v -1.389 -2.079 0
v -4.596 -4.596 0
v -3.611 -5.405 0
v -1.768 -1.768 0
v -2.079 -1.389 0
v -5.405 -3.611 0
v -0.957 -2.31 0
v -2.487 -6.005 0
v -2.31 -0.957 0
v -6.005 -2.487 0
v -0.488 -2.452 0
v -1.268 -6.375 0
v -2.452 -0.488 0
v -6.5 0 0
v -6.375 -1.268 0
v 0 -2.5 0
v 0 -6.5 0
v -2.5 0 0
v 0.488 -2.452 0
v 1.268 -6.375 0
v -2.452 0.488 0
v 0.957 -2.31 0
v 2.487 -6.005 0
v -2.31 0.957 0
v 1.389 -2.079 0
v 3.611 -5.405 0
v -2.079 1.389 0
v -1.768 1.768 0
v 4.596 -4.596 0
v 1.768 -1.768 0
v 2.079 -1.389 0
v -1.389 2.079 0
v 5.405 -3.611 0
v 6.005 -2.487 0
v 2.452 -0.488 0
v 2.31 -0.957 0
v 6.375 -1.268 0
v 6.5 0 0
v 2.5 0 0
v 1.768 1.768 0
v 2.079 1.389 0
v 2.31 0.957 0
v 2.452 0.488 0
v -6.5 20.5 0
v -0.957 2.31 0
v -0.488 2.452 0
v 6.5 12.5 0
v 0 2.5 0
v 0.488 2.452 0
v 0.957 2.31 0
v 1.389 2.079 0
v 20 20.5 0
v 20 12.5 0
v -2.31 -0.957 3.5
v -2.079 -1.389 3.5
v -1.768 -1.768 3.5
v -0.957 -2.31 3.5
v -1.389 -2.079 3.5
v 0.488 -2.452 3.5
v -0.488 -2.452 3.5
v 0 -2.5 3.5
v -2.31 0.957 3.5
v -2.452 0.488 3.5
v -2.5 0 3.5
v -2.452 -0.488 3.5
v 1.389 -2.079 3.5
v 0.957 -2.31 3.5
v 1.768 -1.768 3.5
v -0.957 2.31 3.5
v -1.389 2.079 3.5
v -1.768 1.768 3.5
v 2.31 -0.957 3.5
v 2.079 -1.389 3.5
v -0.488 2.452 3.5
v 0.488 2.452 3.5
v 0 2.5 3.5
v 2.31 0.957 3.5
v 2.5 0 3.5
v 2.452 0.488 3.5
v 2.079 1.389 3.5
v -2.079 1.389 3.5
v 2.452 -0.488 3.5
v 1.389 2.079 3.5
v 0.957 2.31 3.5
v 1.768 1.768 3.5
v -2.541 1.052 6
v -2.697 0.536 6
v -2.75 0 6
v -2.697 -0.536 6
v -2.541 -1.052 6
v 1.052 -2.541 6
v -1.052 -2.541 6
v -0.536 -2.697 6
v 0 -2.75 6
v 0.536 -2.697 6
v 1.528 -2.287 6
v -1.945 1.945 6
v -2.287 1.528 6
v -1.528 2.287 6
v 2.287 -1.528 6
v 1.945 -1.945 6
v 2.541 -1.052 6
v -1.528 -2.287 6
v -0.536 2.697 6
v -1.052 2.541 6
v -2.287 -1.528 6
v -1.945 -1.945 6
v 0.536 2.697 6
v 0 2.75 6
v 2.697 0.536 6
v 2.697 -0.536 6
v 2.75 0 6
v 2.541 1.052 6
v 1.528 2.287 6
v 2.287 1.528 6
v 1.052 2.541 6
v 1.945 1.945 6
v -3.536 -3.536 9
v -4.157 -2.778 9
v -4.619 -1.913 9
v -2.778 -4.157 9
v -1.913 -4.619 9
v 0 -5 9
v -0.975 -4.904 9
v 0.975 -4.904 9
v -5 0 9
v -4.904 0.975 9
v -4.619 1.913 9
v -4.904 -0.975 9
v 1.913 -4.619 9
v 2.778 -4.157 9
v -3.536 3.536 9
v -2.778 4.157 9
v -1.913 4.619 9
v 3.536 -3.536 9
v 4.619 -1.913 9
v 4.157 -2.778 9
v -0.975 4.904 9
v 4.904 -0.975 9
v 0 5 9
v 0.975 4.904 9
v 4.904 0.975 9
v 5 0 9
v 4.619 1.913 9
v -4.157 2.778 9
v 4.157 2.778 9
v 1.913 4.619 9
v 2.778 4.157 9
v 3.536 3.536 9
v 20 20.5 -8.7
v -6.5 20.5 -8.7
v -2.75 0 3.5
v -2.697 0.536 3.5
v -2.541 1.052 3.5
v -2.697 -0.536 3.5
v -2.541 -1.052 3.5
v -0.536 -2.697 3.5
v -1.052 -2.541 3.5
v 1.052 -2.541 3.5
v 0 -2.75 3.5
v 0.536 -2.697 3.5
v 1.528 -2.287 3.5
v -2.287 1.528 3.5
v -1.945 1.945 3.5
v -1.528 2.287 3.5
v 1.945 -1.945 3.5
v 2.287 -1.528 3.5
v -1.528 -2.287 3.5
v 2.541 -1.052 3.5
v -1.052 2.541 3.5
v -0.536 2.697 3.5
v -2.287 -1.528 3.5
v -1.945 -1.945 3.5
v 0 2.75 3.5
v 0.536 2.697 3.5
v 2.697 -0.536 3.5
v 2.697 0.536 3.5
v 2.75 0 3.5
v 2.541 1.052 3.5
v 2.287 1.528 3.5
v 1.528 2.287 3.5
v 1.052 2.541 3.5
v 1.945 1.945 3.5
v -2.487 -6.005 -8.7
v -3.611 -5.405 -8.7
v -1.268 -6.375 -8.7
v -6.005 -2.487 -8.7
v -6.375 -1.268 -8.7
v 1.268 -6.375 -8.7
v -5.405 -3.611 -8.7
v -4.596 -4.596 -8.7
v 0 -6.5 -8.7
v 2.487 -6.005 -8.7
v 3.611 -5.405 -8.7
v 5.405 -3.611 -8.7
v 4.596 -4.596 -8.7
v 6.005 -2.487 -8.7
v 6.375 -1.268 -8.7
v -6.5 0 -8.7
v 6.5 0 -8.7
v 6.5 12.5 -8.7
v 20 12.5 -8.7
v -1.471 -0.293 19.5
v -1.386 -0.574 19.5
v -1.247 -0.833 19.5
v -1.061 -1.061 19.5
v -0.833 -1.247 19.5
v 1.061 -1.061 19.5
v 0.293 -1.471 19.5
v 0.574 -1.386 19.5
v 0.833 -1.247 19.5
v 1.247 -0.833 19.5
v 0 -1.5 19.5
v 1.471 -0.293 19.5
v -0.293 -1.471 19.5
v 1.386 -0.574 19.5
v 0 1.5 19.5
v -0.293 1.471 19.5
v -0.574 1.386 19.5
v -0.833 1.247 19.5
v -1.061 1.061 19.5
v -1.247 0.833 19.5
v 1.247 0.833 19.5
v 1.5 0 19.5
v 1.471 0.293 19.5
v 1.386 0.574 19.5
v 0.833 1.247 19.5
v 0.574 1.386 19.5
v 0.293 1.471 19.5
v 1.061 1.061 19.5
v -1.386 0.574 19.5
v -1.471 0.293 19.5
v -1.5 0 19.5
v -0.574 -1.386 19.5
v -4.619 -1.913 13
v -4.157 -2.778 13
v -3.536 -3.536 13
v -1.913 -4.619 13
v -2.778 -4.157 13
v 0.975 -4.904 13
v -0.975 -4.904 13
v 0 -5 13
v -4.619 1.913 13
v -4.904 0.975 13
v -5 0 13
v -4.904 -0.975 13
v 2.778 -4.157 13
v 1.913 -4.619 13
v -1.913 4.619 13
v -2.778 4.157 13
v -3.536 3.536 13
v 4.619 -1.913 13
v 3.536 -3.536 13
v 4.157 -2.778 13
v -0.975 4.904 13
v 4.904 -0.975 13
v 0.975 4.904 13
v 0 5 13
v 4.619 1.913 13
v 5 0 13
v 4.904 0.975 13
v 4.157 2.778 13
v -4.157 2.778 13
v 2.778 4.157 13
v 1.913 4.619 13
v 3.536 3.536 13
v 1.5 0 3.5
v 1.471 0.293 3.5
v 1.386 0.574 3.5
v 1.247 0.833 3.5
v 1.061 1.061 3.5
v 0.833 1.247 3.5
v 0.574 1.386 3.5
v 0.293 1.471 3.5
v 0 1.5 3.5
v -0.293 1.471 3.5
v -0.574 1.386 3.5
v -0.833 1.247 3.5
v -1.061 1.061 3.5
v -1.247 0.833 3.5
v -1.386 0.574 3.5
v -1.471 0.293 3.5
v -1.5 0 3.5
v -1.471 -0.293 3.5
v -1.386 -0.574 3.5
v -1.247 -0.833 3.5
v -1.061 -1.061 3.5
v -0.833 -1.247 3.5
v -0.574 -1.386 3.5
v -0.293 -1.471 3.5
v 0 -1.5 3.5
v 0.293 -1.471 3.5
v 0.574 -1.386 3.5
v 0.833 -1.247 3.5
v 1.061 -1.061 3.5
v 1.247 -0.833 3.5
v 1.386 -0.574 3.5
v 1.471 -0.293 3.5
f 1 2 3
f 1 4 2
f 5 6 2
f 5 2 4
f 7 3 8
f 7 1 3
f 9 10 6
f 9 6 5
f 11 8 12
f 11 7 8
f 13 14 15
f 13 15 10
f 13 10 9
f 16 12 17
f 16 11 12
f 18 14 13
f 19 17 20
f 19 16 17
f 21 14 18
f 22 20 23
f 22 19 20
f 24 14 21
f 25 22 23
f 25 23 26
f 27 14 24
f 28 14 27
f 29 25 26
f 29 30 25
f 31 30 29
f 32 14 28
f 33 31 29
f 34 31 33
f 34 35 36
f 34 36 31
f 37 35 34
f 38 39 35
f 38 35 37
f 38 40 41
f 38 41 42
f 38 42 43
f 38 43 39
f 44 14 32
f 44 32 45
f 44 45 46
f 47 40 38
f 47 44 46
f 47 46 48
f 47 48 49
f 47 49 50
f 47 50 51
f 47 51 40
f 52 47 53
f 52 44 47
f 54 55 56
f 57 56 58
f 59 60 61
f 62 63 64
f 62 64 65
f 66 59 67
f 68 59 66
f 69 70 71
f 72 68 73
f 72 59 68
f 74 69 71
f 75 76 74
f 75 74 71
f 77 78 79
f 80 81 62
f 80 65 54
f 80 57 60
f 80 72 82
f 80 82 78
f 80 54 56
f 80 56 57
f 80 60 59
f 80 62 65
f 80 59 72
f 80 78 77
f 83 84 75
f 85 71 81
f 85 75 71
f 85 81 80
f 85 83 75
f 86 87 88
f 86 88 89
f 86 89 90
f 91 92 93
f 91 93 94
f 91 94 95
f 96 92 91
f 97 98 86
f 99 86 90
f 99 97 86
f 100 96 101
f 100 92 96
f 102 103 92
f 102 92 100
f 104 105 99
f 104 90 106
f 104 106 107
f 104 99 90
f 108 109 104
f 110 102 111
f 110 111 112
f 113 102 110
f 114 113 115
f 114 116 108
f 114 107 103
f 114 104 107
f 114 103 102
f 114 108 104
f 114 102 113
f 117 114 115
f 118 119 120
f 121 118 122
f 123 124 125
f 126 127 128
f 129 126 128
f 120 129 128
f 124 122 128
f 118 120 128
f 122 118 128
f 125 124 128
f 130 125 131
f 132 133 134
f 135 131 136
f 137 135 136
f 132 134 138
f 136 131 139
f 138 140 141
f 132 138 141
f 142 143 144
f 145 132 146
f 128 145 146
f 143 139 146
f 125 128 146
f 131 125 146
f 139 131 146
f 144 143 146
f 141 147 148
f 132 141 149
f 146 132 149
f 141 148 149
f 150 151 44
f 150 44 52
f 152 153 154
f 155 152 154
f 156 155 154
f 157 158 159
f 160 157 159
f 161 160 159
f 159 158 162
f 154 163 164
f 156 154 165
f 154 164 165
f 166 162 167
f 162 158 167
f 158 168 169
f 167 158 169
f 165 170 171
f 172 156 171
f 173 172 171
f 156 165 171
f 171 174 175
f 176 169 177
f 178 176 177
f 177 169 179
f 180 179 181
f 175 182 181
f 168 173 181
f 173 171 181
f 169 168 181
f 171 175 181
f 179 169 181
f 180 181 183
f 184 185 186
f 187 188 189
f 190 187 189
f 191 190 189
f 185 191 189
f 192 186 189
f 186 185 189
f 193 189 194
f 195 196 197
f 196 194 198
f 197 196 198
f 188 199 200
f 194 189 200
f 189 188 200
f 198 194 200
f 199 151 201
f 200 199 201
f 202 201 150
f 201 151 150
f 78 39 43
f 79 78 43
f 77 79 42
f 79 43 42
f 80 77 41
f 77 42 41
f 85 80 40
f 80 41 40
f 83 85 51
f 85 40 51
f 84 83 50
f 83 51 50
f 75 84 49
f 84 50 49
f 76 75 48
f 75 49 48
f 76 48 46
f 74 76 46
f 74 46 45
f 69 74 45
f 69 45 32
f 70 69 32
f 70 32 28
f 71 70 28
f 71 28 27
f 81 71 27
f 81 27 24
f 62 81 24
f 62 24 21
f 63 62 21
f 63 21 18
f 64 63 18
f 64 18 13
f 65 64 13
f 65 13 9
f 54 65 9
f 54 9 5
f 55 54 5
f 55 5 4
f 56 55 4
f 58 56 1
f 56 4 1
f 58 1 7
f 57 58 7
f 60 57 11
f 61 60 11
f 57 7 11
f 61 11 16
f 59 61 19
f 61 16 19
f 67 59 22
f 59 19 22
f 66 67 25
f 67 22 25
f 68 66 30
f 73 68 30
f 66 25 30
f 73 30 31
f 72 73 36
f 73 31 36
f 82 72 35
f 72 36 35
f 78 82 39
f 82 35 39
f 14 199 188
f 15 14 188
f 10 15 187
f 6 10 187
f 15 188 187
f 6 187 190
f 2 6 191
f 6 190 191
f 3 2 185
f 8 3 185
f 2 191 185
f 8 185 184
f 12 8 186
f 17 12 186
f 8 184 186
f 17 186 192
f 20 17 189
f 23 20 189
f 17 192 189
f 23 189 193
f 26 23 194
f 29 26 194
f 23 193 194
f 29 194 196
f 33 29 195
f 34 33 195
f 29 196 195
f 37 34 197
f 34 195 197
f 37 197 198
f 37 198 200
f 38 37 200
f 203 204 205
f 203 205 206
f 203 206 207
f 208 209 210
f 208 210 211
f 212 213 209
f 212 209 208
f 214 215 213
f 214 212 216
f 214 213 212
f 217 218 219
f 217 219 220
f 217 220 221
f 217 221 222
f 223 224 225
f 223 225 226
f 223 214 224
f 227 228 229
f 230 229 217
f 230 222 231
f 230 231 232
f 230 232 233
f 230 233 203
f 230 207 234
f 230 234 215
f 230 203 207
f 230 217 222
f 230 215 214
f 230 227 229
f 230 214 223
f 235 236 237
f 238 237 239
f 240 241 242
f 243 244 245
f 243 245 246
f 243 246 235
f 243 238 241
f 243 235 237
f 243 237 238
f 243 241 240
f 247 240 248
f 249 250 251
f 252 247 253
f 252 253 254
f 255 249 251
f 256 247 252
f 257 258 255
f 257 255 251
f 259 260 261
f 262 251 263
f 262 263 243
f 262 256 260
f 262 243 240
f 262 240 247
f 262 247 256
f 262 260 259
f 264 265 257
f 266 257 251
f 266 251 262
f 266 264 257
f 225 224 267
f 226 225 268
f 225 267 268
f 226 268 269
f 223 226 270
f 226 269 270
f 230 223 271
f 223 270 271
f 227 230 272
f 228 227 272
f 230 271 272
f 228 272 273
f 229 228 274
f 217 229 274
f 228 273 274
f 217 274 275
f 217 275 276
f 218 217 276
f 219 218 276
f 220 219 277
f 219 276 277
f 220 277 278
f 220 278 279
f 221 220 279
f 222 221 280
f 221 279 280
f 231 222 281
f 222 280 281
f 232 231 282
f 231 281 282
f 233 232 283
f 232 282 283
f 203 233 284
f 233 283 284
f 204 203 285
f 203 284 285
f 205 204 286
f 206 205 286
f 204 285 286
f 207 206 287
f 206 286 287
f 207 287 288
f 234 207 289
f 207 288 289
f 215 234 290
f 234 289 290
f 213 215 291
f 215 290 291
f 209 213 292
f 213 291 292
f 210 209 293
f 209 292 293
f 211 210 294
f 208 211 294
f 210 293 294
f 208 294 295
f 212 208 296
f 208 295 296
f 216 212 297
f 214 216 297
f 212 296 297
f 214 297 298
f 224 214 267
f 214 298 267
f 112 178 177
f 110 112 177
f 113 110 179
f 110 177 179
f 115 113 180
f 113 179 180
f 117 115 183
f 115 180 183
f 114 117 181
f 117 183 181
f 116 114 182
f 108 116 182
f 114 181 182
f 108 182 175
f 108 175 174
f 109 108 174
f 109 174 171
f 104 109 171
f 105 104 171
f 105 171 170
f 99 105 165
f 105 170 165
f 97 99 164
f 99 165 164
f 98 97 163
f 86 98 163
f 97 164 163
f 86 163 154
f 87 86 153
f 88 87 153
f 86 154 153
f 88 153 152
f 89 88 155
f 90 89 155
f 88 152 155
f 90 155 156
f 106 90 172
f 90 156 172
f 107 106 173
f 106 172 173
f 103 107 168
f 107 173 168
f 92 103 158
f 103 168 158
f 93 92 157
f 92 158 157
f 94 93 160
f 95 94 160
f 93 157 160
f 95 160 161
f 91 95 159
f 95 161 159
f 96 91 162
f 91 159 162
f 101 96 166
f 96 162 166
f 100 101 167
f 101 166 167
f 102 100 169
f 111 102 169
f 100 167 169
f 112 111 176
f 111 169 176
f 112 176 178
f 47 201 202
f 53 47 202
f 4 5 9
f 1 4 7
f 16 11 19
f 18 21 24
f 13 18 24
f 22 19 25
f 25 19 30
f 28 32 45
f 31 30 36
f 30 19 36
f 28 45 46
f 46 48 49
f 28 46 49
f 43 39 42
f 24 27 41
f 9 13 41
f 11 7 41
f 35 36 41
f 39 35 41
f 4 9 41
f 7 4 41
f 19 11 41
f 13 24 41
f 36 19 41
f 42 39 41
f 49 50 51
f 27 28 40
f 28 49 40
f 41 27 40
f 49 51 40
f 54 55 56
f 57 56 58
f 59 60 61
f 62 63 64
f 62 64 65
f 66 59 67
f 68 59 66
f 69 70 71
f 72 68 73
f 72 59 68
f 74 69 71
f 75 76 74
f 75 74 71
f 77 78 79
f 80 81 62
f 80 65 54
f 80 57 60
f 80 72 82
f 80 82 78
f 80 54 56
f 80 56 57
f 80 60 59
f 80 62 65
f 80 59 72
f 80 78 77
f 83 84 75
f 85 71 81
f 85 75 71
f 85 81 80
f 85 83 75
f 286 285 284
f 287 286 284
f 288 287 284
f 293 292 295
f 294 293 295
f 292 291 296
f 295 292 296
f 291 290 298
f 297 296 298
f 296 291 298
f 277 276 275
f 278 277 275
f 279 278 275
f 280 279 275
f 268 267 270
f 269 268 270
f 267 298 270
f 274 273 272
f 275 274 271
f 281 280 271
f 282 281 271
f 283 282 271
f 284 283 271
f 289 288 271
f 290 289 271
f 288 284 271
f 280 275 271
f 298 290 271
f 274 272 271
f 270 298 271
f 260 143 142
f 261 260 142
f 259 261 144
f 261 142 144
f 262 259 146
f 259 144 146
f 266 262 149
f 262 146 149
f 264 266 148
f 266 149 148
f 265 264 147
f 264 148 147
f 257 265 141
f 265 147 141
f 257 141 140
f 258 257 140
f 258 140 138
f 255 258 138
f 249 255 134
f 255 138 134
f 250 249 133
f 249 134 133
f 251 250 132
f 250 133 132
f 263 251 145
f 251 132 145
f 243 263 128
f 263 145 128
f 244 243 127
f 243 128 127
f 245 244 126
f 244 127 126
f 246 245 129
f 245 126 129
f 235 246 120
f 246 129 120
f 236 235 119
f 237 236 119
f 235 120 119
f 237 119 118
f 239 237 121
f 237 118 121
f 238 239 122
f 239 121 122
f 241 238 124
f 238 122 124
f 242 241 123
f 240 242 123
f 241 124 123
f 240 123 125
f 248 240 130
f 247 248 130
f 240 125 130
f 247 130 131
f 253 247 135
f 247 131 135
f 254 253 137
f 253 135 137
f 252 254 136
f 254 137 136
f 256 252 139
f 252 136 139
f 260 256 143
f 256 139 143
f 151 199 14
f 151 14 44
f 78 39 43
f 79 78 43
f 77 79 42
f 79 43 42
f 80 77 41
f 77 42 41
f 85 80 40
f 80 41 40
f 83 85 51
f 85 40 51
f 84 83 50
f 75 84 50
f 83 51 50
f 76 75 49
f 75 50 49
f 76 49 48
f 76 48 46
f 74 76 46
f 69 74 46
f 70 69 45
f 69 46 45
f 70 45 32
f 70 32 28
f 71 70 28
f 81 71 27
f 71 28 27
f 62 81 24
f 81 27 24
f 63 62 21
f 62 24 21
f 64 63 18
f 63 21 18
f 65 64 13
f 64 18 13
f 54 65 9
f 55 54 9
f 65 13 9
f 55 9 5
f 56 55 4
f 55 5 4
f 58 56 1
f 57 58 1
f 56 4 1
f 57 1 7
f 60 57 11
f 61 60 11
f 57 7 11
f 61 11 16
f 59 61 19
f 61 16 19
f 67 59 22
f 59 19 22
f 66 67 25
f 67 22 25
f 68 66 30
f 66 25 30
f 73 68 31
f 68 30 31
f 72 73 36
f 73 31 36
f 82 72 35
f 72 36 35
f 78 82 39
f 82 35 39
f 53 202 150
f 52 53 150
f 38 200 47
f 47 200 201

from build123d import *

# Parameters (mm, degrees)
CYLINDER_R        = 1.5
CYLINDER_DEPTH    = 16
CYLINDER001_R     = 2.75
CYLINDER001_DEPTH = 2.5
CYLINDER003_R     = 6.5
CYLINDER003_DEPTH = 8.7
BOX001_W          = 25
BOX001_H          = 8
BOX001_DEPTH      = 8.7
BOX_W             = 13
BOX_H             = 20.5
BOX_DEPTH         = 8.7
CYLINDER002_R     = 2.5
CYLINDER002_DEPTH = 3.5
CYLINDER004_R     = 2.5
CYLINDER004_DEPTH = 3.5
CYLINDER005_R     = 5
CYLINDER005_DEPTH = 4


with BuildPart() as cylinder:
    # Cylinder → Cylinder (new body)
    with BuildSketch(Plane.XY.offset(3.5)):
        Circle(CYLINDER_R)
    extrude(amount=CYLINDER_DEPTH)


with BuildPart() as cylinder001:
    # Cylinder001 → Cylinder001 (new body)
    with BuildSketch(Plane.XY.offset(3.5)):
        Circle(CYLINDER001_R)
    extrude(amount=CYLINDER001_DEPTH)


with BuildPart() as cylinder003:
    # Cylinder003 → Cylinder003 (new body)
    with BuildSketch(Plane.XY.offset(-8.7)):
        Circle(CYLINDER003_R)
    extrude(amount=CYLINDER003_DEPTH)


with BuildPart() as cube001:
    # Box001 → Box001 (new body)
    with BuildSketch(Plane(origin=(-5, 12.5, -8.7), x_dir=(1, 0, 0), z_dir=(0, 0, 1))):
        with Locations((12.5, 4)):
            Rectangle(BOX001_W, BOX001_H)
    extrude(amount=BOX001_DEPTH)


with BuildPart() as cube:
    # Box → Box (new body)
    with BuildSketch(Plane(origin=(-6.5, 0, -8.7), x_dir=(1, 0, 0), z_dir=(0, 0, 1))):
        with Locations((6.5, 10.25)):
            Rectangle(BOX_W, BOX_H)
    extrude(amount=BOX_DEPTH)


with BuildPart() as motor:
    # Cylinder002 → Cylinder002 (new body)
    with BuildSketch(Plane.XY):
        Circle(CYLINDER002_R)
    extrude(amount=CYLINDER002_DEPTH)

    # Fusion: union Cylinder003, Cube001, Cube
    add(cylinder003.part)
    add(cube001.part)
    add(cube.part)


with BuildPart() as cylinder004:
    # Cylinder004 → Cylinder004 (new body)
    with BuildSketch(Plane.XY):
        Circle(CYLINDER004_R)
    extrude(amount=CYLINDER004_DEPTH)


with BuildPart() as bearing:
    # Cylinder005 → Cylinder005 (new body)
    with BuildSketch(Plane.XY.offset(9)):
        Circle(CYLINDER005_R)
    extrude(amount=CYLINDER005_DEPTH)


solid = Compound([cylinder.part, cylinder001.part, motor.part, cylinder004.part, bearing.part])
